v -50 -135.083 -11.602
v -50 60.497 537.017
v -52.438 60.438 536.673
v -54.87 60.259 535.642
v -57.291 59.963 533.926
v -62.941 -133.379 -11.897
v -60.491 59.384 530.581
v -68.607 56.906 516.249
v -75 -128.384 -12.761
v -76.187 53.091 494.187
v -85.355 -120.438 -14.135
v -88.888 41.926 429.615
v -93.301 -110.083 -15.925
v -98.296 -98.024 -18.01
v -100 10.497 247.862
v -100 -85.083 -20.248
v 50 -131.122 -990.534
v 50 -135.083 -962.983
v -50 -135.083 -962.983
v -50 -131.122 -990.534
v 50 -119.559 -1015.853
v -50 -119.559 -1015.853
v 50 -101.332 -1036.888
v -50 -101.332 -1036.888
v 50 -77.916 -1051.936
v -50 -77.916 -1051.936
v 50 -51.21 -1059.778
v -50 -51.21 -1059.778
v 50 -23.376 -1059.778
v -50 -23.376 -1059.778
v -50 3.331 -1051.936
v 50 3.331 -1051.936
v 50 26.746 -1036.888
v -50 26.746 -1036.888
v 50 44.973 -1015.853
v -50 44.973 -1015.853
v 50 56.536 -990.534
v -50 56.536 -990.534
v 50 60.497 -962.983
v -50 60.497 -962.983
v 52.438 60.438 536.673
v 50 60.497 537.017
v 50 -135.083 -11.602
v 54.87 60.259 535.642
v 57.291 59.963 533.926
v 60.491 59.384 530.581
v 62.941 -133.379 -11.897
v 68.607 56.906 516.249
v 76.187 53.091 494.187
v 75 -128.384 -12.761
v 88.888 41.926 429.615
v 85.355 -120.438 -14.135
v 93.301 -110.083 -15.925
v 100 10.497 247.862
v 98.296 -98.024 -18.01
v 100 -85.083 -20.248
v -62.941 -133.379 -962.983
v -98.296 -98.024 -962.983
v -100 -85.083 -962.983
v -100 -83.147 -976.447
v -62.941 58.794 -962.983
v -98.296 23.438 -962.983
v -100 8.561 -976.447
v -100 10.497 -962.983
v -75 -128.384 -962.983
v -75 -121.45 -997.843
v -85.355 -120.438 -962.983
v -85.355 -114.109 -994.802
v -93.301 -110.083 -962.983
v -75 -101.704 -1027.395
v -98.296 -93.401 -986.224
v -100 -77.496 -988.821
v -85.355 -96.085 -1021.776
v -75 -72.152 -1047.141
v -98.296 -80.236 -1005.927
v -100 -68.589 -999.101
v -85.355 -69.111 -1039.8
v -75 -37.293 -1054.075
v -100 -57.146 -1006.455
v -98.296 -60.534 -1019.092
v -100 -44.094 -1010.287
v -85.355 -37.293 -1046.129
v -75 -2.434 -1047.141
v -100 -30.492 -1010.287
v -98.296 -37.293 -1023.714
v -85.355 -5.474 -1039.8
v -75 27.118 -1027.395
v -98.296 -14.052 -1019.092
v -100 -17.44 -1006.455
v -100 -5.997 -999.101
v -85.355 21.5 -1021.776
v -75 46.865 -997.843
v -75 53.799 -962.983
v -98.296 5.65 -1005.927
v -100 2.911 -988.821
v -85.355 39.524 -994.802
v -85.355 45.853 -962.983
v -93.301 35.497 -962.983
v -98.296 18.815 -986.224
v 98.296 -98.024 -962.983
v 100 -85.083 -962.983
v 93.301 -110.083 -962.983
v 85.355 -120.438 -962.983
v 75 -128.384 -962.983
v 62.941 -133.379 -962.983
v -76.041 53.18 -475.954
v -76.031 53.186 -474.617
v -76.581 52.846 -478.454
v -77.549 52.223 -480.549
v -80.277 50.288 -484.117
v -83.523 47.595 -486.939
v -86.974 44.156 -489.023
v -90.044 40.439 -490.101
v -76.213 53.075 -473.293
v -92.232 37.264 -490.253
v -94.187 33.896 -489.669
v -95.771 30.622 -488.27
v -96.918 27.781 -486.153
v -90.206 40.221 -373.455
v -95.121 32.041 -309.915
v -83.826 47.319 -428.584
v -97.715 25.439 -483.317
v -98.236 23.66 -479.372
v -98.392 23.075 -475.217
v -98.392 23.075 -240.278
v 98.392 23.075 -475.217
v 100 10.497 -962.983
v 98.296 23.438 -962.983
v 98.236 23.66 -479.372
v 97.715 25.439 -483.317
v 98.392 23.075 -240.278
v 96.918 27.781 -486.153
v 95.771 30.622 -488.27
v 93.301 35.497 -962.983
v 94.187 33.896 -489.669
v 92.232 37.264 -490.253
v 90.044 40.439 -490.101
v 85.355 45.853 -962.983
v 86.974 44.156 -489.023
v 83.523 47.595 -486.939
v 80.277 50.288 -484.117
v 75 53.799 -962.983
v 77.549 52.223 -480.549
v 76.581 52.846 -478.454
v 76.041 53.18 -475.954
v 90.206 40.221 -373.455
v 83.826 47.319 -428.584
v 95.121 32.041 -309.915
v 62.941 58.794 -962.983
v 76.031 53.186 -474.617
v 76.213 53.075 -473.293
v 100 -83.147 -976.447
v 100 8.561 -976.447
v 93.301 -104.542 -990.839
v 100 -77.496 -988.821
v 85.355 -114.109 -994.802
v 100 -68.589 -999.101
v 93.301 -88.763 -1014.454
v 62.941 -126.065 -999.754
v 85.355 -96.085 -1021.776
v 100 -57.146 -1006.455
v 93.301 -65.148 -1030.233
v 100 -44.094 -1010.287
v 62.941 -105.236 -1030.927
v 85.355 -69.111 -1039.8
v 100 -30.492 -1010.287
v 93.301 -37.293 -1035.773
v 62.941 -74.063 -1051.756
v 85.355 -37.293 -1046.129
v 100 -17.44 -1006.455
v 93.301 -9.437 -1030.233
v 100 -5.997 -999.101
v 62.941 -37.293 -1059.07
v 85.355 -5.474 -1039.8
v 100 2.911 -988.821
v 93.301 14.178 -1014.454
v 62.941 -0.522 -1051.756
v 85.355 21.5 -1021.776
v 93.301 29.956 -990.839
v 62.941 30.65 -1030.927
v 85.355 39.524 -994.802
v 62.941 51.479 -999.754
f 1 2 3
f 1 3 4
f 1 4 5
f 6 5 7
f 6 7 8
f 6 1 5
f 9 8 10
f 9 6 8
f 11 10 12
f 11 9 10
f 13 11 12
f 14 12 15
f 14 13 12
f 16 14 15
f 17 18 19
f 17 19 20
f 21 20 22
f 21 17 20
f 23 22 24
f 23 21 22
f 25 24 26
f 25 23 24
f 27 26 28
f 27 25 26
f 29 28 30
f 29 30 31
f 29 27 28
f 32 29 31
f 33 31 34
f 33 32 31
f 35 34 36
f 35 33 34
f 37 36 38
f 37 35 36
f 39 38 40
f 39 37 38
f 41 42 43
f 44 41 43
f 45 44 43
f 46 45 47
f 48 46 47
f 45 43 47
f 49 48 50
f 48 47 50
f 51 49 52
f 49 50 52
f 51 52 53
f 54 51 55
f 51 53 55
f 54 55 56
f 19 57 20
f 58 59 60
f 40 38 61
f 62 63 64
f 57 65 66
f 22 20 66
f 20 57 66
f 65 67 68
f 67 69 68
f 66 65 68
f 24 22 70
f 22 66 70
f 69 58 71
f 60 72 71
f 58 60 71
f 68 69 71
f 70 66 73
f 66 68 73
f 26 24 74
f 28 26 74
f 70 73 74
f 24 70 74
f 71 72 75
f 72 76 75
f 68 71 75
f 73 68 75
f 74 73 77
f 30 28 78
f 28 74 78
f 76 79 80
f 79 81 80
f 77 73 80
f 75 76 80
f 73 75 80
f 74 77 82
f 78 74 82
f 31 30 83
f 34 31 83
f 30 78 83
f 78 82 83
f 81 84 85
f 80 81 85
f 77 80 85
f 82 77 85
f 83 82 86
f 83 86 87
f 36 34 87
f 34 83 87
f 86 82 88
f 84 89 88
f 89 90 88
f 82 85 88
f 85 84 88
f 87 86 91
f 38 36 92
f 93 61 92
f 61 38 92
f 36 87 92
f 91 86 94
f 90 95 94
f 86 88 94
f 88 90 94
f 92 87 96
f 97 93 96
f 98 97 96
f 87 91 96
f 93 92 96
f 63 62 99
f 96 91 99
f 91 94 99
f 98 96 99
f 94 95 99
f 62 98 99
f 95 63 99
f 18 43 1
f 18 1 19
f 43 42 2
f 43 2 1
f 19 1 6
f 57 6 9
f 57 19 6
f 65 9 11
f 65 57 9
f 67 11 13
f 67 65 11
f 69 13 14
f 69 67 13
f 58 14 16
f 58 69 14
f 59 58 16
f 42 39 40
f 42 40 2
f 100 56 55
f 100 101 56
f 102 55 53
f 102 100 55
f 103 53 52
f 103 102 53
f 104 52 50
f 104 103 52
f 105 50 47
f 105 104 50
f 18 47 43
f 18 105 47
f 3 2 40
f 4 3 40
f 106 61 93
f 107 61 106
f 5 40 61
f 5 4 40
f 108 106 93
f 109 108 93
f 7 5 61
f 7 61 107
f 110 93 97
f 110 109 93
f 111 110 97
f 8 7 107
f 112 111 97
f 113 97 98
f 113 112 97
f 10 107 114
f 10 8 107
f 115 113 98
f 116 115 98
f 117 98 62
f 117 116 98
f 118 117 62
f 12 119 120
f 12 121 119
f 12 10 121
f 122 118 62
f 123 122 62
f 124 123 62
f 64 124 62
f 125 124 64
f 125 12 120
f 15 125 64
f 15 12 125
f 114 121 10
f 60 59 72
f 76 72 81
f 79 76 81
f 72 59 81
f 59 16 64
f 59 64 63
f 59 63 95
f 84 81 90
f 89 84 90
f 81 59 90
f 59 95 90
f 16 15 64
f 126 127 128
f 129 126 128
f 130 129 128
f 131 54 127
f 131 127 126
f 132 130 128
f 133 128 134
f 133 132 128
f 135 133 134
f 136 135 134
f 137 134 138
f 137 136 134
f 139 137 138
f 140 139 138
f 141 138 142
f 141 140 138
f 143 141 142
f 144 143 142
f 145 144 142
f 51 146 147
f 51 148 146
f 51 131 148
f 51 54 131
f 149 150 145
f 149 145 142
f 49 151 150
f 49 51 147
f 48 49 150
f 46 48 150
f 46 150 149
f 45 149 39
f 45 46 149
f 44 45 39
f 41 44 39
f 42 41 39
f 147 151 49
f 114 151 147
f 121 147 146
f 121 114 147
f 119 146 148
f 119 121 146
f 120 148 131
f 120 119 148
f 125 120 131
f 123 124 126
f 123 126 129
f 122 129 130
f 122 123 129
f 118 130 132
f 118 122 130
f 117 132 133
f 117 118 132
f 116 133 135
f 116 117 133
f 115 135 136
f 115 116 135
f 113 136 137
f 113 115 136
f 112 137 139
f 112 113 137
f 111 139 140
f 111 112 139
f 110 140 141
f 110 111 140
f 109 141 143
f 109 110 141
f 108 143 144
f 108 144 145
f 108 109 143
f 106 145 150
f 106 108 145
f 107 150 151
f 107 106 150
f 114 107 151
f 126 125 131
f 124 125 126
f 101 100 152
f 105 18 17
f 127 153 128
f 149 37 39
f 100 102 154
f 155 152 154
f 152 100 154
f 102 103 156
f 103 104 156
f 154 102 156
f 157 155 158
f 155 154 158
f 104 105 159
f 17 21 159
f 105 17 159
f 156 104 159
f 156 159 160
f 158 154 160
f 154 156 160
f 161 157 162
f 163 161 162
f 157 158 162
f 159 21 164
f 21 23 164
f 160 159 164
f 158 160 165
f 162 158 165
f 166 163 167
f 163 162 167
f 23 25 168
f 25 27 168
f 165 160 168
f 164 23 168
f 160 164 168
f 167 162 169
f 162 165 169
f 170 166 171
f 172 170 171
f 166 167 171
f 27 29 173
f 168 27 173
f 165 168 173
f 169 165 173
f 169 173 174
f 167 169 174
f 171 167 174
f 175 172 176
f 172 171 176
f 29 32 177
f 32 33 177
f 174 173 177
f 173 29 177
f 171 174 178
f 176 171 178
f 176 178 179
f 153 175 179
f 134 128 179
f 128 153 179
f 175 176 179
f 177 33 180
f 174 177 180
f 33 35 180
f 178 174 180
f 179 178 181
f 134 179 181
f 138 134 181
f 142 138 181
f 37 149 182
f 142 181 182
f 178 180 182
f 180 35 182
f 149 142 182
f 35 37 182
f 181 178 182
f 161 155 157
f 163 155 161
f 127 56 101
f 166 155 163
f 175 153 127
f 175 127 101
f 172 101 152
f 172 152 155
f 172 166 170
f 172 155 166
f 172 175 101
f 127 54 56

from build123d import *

# Parameters (mm, degrees)
BOSS_EXTRUDE1_DEPTH = 100
FILLET1_R           = 50
CUT_EXTRUDE1_DEPTH  = 300


with BuildPart() as part:
    # Sketch1 → Boss-Extrude1 (new, symmetric)
    with BuildSketch(Plane(origin=(0, 0, 0), x_dir=(0, 0, -1), z_dir=(1, 0, 0))):
        with BuildLine():
            Line((-537.016574586, 60.497237569), (11.602209945, -135.082872928))
            Line((11.602209945, -135.082872928), (962.983425414, -135.082872928))
            ThreePointArc((962.983425414, -135.082872928), (1060.773480663, -37.29281768), (962.983425414, 60.497237569))
            Line((962.983425414, 60.497237569), (-537.016574586, 60.497237569))
        make_face()
    extrude(amount=BOSS_EXTRUDE1_DEPTH, both=True)

    # Fillet1
    fillet1_edges = [part.edges().sort_by_distance(p)[0] for p in [
        (-100, -135.082872928, -487.29281768),
        (-100, -37.29281768, 262.70718232),
        (-100, 60.497237569, -212.983425414),
        (100, -37.29281768, 262.70718232),
        (100, -135.082872928, -487.29281768),
        (100, -37.29281768, -1060.773480663),
        (100, 60.497237569, -212.983425414),
        (-100, -37.29281768, -1060.773480663),
    ]]
    fillet(fillet1_edges, radius=FILLET1_R)

    # Sketch2 → Cut-Extrude1 (cut)
    with BuildSketch(Plane.ZY.offset(100)):
        with BuildLine():
            Line((-240.278412459, 23.075070398), (-475.216763111, 23.075070398))
            ThreePointArc((-475.216763111, 23.075070398), (-490.247556178, 39.100328004), (-473.293494818, 53.075070398))
            Line((-473.293494818, 53.075070398), (-240.278412459, 23.075070398))
        make_face()
    extrude(amount=-CUT_EXTRUDE1_DEPTH, mode=Mode.SUBTRACT)


solid = part.part
